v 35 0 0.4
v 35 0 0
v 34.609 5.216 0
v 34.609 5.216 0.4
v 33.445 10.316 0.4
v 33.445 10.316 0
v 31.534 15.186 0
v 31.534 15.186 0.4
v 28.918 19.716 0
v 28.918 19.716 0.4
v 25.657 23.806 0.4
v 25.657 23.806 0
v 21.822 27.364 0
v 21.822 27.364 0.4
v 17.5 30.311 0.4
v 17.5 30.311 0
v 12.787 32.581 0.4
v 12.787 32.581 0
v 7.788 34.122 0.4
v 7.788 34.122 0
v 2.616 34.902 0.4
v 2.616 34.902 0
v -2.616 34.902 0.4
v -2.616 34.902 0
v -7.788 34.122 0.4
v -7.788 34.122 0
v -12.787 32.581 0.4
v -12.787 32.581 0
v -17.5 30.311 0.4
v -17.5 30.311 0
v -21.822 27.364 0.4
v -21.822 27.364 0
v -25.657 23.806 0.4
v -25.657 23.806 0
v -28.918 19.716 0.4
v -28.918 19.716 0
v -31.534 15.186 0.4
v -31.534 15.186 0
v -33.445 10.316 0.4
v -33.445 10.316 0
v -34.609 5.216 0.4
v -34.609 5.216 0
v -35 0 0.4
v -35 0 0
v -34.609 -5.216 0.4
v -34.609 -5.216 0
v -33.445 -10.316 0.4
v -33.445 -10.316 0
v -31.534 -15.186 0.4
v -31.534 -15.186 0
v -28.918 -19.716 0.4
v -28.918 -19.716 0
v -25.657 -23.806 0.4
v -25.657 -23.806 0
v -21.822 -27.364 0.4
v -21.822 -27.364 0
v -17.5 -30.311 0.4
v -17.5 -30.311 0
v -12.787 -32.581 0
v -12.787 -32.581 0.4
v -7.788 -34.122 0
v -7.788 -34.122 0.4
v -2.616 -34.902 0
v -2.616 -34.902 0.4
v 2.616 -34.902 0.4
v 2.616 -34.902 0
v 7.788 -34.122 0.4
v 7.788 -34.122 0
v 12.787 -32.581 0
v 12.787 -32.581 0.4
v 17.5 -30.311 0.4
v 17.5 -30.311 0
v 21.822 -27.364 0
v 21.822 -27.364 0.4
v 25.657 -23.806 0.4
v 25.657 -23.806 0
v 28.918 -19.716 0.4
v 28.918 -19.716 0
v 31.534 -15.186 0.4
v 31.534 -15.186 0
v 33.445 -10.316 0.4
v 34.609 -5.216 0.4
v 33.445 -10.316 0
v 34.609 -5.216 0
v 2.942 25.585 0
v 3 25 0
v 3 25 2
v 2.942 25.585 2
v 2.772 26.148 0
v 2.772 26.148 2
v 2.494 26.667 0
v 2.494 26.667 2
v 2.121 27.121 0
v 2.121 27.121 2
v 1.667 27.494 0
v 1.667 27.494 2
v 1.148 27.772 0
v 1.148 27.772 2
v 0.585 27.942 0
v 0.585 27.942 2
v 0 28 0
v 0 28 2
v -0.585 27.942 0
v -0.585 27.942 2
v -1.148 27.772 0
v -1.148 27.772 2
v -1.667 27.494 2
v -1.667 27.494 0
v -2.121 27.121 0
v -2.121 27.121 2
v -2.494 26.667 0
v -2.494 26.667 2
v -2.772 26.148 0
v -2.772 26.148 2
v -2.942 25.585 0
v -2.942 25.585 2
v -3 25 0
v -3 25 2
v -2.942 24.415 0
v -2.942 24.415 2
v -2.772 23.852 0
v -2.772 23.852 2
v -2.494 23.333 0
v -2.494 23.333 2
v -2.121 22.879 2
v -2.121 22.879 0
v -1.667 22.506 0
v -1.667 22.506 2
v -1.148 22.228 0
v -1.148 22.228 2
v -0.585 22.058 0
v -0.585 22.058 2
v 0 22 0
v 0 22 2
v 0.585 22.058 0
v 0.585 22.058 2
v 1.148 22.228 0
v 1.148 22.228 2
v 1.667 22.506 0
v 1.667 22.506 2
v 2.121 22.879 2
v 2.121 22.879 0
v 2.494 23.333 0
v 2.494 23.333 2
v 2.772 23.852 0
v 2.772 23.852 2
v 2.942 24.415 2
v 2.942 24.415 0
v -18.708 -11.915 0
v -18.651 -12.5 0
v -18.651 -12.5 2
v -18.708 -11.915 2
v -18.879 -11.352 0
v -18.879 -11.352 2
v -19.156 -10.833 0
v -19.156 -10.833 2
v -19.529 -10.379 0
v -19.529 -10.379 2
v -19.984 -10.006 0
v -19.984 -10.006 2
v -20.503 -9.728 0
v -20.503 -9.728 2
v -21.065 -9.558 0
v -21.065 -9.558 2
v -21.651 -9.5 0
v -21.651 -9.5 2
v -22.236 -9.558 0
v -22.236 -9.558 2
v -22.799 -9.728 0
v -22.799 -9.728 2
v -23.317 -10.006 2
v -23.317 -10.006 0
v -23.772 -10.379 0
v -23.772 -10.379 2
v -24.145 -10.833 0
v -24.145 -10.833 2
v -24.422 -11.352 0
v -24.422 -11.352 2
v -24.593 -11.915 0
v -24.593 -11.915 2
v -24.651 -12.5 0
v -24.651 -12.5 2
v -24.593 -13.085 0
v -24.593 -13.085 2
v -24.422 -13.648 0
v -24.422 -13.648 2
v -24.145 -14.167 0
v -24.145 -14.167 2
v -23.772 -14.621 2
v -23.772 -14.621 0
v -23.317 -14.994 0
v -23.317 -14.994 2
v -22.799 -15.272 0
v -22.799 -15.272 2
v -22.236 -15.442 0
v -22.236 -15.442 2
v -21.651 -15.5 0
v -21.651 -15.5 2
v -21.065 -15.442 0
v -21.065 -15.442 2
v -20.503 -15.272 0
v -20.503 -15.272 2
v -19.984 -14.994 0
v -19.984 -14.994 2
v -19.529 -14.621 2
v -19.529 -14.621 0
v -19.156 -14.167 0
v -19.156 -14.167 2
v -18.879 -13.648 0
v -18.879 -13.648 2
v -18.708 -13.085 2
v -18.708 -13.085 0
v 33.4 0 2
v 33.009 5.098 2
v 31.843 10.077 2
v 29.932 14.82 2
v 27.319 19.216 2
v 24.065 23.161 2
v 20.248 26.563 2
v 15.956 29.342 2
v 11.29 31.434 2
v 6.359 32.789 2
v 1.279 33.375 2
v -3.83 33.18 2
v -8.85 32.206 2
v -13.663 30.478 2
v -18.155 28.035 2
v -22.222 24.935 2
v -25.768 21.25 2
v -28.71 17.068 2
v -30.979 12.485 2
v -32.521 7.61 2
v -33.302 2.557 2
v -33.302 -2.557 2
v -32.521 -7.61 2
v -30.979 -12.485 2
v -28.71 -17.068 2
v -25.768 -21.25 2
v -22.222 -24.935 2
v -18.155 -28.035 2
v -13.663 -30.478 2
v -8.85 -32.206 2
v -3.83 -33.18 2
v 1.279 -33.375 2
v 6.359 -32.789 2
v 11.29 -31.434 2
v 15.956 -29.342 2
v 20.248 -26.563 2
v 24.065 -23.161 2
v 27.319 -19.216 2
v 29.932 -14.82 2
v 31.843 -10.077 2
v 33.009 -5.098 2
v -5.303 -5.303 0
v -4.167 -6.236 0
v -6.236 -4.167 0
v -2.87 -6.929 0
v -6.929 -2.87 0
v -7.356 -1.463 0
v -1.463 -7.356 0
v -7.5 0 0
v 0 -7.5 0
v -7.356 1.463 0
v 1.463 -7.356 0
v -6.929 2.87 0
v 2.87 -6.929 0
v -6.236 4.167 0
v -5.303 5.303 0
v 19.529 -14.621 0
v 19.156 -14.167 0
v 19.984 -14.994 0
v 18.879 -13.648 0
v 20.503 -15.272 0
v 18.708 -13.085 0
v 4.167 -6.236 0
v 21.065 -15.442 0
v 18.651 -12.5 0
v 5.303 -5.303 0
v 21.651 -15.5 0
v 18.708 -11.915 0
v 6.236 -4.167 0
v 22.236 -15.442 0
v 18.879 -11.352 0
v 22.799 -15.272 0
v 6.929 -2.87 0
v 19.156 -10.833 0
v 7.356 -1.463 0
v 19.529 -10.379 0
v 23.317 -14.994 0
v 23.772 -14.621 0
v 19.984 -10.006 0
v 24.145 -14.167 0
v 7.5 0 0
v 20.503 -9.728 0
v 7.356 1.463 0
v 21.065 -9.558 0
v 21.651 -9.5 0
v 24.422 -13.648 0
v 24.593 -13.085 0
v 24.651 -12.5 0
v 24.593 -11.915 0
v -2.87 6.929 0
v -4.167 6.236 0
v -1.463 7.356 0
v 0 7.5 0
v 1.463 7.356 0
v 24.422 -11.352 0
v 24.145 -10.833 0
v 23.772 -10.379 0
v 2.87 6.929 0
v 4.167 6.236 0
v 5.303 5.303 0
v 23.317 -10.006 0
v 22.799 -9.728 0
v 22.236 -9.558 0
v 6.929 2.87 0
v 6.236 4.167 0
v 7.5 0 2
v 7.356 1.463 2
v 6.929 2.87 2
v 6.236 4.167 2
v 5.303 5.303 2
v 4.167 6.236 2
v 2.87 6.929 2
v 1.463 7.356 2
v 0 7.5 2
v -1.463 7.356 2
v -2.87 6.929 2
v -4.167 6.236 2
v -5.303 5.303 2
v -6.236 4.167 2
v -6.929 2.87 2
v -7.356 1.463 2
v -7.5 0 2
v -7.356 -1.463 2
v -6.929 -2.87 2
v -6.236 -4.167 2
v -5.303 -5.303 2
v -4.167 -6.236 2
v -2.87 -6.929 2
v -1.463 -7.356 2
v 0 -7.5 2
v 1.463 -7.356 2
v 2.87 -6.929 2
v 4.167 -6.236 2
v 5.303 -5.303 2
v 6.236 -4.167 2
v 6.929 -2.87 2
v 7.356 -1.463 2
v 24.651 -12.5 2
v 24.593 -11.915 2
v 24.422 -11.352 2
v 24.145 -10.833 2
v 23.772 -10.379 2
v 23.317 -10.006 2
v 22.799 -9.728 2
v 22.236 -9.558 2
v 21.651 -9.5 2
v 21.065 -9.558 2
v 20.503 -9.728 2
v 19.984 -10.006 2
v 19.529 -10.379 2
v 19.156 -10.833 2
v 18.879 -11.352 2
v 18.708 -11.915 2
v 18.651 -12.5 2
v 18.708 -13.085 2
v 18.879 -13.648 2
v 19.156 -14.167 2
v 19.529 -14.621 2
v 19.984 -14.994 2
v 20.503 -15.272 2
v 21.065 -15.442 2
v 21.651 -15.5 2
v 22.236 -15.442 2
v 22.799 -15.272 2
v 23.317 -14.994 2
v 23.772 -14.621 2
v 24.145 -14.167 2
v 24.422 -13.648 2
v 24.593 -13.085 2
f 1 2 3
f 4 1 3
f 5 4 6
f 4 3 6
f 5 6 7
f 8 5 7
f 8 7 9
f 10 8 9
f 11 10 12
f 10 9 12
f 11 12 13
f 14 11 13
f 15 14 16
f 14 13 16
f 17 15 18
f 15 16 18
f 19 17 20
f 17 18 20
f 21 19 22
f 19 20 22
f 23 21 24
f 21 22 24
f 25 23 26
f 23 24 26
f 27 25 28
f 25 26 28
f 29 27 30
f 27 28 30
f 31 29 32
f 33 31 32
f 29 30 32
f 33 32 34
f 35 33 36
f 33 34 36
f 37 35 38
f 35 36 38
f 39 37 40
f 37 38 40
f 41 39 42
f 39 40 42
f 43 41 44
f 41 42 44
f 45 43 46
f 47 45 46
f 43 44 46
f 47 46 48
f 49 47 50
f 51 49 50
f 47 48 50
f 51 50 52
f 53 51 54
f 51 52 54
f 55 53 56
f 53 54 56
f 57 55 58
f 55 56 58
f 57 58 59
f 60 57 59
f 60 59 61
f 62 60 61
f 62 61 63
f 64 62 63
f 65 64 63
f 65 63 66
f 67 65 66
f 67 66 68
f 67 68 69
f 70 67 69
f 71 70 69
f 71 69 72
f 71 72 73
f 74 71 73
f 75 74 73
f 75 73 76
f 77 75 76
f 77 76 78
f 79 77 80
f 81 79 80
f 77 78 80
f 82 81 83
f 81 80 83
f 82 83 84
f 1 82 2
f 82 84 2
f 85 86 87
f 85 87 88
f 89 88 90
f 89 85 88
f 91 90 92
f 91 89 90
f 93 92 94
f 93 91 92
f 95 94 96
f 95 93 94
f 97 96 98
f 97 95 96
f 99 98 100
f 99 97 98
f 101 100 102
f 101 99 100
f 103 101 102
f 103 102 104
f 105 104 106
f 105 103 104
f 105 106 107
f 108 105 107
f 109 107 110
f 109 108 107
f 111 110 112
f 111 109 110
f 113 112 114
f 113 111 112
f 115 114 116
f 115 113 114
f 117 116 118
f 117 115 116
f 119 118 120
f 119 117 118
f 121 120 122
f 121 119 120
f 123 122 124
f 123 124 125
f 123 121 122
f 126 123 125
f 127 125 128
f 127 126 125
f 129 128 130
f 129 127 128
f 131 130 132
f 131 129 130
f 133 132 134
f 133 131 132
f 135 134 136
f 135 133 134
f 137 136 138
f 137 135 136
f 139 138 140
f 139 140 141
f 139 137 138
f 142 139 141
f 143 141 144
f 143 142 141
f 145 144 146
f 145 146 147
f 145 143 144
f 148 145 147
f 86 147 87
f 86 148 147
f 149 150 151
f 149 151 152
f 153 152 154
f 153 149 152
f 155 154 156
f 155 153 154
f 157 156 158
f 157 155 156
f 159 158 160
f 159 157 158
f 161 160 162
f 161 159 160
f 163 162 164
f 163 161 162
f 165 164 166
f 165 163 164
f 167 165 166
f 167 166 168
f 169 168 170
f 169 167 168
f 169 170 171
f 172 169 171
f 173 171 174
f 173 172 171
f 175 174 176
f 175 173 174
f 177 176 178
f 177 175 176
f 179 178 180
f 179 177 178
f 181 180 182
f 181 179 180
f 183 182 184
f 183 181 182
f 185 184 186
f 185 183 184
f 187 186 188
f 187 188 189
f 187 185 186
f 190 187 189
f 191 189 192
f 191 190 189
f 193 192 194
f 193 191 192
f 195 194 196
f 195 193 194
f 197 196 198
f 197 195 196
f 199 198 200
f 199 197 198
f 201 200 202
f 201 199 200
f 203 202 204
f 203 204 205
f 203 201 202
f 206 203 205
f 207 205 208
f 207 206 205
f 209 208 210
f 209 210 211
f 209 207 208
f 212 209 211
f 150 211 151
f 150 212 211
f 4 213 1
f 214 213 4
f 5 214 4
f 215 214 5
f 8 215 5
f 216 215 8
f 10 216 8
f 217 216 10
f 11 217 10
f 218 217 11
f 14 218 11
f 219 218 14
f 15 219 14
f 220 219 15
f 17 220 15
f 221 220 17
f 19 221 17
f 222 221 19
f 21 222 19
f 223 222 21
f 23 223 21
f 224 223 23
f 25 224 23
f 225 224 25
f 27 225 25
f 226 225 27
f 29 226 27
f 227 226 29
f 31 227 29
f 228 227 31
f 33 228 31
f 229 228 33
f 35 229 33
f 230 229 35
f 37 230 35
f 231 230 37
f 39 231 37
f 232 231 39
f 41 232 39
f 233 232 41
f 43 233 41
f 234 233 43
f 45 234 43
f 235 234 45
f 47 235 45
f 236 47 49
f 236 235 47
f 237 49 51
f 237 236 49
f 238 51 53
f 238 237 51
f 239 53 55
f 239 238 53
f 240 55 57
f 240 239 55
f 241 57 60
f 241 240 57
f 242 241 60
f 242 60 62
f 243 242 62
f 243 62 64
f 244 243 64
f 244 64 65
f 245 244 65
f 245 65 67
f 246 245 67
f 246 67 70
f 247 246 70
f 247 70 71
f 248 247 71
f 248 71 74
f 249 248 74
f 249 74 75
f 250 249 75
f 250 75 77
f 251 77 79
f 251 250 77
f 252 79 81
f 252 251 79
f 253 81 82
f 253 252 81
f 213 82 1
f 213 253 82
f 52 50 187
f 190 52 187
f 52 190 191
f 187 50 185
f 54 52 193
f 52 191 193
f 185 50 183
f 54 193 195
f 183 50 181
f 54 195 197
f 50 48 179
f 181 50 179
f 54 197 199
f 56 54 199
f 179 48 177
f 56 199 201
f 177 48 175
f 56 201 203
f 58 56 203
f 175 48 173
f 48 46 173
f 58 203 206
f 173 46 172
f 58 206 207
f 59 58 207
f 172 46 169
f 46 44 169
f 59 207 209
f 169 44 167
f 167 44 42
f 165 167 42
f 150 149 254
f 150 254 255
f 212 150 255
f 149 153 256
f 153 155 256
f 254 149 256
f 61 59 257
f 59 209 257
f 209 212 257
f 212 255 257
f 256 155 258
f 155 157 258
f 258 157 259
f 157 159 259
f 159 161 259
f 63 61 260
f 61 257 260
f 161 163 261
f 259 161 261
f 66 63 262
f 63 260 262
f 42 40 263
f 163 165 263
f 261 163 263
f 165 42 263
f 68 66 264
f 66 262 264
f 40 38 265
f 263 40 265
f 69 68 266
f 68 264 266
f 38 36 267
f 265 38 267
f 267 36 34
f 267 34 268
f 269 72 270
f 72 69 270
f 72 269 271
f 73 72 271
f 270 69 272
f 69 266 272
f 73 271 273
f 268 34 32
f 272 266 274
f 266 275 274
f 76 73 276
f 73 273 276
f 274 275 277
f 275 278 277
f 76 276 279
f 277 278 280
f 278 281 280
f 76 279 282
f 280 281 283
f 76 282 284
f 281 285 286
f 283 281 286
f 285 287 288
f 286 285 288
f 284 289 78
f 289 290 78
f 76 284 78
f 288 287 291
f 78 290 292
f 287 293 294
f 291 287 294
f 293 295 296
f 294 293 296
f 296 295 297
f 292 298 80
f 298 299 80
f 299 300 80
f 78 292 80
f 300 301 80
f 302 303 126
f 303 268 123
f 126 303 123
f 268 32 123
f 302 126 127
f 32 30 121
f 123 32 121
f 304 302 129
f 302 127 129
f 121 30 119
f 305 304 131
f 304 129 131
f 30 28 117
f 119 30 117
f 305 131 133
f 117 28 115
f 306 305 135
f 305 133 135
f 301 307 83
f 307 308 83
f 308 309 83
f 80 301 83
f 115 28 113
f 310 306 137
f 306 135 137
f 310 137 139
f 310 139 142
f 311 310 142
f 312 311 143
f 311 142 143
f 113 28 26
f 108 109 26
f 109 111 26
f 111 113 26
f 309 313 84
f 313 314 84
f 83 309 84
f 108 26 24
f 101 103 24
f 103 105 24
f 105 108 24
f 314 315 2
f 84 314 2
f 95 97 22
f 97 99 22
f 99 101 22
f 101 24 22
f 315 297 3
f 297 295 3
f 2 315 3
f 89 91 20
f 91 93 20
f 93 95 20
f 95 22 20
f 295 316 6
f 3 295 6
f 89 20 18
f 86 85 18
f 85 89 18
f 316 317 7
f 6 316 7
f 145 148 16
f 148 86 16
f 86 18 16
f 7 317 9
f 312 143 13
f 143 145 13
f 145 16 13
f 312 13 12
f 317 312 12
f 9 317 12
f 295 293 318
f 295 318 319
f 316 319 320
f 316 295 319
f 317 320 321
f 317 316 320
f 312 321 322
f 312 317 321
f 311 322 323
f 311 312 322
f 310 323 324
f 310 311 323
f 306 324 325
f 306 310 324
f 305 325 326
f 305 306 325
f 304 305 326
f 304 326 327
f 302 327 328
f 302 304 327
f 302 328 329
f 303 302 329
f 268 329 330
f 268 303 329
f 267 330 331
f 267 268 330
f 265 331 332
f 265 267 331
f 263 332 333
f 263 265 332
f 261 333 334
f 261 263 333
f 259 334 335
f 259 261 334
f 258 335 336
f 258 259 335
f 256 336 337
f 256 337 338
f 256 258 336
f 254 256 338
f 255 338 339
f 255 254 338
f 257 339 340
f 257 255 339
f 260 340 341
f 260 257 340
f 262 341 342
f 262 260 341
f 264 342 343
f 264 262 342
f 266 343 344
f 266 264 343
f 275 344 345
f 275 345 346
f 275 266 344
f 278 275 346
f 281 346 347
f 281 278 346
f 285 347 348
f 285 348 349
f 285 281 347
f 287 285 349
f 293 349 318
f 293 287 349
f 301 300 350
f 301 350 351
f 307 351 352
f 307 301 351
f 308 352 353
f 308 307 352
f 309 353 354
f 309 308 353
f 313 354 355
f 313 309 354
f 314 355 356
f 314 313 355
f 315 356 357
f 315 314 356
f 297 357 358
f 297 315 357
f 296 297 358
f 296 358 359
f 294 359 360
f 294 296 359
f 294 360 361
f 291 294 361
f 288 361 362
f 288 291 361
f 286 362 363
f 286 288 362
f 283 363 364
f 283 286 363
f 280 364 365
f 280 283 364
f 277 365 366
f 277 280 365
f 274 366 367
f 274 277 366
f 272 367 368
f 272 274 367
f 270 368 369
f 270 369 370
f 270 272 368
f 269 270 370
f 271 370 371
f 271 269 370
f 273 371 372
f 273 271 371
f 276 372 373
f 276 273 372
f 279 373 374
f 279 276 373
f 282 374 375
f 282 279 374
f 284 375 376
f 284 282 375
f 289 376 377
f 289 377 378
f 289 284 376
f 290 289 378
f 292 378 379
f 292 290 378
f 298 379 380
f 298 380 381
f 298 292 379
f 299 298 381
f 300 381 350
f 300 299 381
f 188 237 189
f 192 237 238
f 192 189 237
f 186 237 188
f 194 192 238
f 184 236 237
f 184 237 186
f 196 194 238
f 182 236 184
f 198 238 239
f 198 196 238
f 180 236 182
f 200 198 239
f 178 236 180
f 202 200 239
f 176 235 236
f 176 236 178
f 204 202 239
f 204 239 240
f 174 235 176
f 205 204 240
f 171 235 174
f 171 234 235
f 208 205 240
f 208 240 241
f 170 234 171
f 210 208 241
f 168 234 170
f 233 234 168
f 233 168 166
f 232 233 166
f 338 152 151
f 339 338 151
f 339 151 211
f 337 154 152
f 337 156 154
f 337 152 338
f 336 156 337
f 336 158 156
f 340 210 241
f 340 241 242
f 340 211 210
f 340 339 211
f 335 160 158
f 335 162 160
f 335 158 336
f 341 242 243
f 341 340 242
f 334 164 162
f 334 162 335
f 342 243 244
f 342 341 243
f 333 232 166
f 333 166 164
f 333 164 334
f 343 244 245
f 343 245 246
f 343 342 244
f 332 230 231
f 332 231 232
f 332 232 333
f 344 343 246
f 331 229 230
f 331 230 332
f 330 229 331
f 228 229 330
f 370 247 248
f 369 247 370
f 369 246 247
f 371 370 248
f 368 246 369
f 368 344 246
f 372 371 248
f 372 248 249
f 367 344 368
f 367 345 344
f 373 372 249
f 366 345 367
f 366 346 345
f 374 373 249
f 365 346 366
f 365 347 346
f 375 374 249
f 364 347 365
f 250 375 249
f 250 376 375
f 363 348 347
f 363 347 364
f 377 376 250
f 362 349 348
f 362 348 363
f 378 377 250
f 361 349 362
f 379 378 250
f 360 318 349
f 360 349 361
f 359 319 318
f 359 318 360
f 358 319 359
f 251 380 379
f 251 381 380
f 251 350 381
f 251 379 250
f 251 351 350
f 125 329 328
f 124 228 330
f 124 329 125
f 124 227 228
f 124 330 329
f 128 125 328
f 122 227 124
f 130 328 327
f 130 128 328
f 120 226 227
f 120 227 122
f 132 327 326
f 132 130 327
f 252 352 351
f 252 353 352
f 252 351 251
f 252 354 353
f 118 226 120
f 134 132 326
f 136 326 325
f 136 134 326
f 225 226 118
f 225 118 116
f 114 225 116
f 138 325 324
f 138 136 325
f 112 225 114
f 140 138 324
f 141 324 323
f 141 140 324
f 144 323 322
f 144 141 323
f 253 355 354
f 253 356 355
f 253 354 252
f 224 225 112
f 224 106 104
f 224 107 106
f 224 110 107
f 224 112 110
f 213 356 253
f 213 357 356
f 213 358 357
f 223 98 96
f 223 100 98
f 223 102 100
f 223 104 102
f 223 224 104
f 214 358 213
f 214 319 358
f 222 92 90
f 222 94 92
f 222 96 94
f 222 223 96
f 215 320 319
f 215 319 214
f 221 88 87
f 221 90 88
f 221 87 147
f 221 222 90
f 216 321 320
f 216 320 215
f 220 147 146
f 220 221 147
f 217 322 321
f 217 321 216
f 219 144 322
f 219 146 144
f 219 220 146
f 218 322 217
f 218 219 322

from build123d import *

# Parameters (mm, degrees)
SKETCH1_R           = 35
SKETCH1_R_2         = 7.5
SKETCH1_R_3         = 3
BOSS_EXTRUDE1_DEPTH = 2
CHAMFER1_SIZE       = 1.6


with BuildPart() as part:
    # Sketch1 → Boss-Extrude1 (new body)
    with BuildSketch(Plane.XY):
        Circle(SKETCH1_R)
        Circle(SKETCH1_R_2, mode=Mode.SUBTRACT)
        with Locations((0, 25)):
            Circle(SKETCH1_R_3, mode=Mode.SUBTRACT)
        with Locations((21.650635095, -12.5)):
            Circle(SKETCH1_R_3, mode=Mode.SUBTRACT)
        with Locations((-21.650635095, -12.5)):
            Circle(SKETCH1_R_3, mode=Mode.SUBTRACT)
    extrude(amount=BOSS_EXTRUDE1_DEPTH)

    # Chamfer1
    chamfer1_edges = [part.edges().sort_by_distance(p)[0] for p in [
        (-35, 0, 2),
    ]]
    chamfer(chamfer1_edges, length=CHAMFER1_SIZE)


solid = part.part
